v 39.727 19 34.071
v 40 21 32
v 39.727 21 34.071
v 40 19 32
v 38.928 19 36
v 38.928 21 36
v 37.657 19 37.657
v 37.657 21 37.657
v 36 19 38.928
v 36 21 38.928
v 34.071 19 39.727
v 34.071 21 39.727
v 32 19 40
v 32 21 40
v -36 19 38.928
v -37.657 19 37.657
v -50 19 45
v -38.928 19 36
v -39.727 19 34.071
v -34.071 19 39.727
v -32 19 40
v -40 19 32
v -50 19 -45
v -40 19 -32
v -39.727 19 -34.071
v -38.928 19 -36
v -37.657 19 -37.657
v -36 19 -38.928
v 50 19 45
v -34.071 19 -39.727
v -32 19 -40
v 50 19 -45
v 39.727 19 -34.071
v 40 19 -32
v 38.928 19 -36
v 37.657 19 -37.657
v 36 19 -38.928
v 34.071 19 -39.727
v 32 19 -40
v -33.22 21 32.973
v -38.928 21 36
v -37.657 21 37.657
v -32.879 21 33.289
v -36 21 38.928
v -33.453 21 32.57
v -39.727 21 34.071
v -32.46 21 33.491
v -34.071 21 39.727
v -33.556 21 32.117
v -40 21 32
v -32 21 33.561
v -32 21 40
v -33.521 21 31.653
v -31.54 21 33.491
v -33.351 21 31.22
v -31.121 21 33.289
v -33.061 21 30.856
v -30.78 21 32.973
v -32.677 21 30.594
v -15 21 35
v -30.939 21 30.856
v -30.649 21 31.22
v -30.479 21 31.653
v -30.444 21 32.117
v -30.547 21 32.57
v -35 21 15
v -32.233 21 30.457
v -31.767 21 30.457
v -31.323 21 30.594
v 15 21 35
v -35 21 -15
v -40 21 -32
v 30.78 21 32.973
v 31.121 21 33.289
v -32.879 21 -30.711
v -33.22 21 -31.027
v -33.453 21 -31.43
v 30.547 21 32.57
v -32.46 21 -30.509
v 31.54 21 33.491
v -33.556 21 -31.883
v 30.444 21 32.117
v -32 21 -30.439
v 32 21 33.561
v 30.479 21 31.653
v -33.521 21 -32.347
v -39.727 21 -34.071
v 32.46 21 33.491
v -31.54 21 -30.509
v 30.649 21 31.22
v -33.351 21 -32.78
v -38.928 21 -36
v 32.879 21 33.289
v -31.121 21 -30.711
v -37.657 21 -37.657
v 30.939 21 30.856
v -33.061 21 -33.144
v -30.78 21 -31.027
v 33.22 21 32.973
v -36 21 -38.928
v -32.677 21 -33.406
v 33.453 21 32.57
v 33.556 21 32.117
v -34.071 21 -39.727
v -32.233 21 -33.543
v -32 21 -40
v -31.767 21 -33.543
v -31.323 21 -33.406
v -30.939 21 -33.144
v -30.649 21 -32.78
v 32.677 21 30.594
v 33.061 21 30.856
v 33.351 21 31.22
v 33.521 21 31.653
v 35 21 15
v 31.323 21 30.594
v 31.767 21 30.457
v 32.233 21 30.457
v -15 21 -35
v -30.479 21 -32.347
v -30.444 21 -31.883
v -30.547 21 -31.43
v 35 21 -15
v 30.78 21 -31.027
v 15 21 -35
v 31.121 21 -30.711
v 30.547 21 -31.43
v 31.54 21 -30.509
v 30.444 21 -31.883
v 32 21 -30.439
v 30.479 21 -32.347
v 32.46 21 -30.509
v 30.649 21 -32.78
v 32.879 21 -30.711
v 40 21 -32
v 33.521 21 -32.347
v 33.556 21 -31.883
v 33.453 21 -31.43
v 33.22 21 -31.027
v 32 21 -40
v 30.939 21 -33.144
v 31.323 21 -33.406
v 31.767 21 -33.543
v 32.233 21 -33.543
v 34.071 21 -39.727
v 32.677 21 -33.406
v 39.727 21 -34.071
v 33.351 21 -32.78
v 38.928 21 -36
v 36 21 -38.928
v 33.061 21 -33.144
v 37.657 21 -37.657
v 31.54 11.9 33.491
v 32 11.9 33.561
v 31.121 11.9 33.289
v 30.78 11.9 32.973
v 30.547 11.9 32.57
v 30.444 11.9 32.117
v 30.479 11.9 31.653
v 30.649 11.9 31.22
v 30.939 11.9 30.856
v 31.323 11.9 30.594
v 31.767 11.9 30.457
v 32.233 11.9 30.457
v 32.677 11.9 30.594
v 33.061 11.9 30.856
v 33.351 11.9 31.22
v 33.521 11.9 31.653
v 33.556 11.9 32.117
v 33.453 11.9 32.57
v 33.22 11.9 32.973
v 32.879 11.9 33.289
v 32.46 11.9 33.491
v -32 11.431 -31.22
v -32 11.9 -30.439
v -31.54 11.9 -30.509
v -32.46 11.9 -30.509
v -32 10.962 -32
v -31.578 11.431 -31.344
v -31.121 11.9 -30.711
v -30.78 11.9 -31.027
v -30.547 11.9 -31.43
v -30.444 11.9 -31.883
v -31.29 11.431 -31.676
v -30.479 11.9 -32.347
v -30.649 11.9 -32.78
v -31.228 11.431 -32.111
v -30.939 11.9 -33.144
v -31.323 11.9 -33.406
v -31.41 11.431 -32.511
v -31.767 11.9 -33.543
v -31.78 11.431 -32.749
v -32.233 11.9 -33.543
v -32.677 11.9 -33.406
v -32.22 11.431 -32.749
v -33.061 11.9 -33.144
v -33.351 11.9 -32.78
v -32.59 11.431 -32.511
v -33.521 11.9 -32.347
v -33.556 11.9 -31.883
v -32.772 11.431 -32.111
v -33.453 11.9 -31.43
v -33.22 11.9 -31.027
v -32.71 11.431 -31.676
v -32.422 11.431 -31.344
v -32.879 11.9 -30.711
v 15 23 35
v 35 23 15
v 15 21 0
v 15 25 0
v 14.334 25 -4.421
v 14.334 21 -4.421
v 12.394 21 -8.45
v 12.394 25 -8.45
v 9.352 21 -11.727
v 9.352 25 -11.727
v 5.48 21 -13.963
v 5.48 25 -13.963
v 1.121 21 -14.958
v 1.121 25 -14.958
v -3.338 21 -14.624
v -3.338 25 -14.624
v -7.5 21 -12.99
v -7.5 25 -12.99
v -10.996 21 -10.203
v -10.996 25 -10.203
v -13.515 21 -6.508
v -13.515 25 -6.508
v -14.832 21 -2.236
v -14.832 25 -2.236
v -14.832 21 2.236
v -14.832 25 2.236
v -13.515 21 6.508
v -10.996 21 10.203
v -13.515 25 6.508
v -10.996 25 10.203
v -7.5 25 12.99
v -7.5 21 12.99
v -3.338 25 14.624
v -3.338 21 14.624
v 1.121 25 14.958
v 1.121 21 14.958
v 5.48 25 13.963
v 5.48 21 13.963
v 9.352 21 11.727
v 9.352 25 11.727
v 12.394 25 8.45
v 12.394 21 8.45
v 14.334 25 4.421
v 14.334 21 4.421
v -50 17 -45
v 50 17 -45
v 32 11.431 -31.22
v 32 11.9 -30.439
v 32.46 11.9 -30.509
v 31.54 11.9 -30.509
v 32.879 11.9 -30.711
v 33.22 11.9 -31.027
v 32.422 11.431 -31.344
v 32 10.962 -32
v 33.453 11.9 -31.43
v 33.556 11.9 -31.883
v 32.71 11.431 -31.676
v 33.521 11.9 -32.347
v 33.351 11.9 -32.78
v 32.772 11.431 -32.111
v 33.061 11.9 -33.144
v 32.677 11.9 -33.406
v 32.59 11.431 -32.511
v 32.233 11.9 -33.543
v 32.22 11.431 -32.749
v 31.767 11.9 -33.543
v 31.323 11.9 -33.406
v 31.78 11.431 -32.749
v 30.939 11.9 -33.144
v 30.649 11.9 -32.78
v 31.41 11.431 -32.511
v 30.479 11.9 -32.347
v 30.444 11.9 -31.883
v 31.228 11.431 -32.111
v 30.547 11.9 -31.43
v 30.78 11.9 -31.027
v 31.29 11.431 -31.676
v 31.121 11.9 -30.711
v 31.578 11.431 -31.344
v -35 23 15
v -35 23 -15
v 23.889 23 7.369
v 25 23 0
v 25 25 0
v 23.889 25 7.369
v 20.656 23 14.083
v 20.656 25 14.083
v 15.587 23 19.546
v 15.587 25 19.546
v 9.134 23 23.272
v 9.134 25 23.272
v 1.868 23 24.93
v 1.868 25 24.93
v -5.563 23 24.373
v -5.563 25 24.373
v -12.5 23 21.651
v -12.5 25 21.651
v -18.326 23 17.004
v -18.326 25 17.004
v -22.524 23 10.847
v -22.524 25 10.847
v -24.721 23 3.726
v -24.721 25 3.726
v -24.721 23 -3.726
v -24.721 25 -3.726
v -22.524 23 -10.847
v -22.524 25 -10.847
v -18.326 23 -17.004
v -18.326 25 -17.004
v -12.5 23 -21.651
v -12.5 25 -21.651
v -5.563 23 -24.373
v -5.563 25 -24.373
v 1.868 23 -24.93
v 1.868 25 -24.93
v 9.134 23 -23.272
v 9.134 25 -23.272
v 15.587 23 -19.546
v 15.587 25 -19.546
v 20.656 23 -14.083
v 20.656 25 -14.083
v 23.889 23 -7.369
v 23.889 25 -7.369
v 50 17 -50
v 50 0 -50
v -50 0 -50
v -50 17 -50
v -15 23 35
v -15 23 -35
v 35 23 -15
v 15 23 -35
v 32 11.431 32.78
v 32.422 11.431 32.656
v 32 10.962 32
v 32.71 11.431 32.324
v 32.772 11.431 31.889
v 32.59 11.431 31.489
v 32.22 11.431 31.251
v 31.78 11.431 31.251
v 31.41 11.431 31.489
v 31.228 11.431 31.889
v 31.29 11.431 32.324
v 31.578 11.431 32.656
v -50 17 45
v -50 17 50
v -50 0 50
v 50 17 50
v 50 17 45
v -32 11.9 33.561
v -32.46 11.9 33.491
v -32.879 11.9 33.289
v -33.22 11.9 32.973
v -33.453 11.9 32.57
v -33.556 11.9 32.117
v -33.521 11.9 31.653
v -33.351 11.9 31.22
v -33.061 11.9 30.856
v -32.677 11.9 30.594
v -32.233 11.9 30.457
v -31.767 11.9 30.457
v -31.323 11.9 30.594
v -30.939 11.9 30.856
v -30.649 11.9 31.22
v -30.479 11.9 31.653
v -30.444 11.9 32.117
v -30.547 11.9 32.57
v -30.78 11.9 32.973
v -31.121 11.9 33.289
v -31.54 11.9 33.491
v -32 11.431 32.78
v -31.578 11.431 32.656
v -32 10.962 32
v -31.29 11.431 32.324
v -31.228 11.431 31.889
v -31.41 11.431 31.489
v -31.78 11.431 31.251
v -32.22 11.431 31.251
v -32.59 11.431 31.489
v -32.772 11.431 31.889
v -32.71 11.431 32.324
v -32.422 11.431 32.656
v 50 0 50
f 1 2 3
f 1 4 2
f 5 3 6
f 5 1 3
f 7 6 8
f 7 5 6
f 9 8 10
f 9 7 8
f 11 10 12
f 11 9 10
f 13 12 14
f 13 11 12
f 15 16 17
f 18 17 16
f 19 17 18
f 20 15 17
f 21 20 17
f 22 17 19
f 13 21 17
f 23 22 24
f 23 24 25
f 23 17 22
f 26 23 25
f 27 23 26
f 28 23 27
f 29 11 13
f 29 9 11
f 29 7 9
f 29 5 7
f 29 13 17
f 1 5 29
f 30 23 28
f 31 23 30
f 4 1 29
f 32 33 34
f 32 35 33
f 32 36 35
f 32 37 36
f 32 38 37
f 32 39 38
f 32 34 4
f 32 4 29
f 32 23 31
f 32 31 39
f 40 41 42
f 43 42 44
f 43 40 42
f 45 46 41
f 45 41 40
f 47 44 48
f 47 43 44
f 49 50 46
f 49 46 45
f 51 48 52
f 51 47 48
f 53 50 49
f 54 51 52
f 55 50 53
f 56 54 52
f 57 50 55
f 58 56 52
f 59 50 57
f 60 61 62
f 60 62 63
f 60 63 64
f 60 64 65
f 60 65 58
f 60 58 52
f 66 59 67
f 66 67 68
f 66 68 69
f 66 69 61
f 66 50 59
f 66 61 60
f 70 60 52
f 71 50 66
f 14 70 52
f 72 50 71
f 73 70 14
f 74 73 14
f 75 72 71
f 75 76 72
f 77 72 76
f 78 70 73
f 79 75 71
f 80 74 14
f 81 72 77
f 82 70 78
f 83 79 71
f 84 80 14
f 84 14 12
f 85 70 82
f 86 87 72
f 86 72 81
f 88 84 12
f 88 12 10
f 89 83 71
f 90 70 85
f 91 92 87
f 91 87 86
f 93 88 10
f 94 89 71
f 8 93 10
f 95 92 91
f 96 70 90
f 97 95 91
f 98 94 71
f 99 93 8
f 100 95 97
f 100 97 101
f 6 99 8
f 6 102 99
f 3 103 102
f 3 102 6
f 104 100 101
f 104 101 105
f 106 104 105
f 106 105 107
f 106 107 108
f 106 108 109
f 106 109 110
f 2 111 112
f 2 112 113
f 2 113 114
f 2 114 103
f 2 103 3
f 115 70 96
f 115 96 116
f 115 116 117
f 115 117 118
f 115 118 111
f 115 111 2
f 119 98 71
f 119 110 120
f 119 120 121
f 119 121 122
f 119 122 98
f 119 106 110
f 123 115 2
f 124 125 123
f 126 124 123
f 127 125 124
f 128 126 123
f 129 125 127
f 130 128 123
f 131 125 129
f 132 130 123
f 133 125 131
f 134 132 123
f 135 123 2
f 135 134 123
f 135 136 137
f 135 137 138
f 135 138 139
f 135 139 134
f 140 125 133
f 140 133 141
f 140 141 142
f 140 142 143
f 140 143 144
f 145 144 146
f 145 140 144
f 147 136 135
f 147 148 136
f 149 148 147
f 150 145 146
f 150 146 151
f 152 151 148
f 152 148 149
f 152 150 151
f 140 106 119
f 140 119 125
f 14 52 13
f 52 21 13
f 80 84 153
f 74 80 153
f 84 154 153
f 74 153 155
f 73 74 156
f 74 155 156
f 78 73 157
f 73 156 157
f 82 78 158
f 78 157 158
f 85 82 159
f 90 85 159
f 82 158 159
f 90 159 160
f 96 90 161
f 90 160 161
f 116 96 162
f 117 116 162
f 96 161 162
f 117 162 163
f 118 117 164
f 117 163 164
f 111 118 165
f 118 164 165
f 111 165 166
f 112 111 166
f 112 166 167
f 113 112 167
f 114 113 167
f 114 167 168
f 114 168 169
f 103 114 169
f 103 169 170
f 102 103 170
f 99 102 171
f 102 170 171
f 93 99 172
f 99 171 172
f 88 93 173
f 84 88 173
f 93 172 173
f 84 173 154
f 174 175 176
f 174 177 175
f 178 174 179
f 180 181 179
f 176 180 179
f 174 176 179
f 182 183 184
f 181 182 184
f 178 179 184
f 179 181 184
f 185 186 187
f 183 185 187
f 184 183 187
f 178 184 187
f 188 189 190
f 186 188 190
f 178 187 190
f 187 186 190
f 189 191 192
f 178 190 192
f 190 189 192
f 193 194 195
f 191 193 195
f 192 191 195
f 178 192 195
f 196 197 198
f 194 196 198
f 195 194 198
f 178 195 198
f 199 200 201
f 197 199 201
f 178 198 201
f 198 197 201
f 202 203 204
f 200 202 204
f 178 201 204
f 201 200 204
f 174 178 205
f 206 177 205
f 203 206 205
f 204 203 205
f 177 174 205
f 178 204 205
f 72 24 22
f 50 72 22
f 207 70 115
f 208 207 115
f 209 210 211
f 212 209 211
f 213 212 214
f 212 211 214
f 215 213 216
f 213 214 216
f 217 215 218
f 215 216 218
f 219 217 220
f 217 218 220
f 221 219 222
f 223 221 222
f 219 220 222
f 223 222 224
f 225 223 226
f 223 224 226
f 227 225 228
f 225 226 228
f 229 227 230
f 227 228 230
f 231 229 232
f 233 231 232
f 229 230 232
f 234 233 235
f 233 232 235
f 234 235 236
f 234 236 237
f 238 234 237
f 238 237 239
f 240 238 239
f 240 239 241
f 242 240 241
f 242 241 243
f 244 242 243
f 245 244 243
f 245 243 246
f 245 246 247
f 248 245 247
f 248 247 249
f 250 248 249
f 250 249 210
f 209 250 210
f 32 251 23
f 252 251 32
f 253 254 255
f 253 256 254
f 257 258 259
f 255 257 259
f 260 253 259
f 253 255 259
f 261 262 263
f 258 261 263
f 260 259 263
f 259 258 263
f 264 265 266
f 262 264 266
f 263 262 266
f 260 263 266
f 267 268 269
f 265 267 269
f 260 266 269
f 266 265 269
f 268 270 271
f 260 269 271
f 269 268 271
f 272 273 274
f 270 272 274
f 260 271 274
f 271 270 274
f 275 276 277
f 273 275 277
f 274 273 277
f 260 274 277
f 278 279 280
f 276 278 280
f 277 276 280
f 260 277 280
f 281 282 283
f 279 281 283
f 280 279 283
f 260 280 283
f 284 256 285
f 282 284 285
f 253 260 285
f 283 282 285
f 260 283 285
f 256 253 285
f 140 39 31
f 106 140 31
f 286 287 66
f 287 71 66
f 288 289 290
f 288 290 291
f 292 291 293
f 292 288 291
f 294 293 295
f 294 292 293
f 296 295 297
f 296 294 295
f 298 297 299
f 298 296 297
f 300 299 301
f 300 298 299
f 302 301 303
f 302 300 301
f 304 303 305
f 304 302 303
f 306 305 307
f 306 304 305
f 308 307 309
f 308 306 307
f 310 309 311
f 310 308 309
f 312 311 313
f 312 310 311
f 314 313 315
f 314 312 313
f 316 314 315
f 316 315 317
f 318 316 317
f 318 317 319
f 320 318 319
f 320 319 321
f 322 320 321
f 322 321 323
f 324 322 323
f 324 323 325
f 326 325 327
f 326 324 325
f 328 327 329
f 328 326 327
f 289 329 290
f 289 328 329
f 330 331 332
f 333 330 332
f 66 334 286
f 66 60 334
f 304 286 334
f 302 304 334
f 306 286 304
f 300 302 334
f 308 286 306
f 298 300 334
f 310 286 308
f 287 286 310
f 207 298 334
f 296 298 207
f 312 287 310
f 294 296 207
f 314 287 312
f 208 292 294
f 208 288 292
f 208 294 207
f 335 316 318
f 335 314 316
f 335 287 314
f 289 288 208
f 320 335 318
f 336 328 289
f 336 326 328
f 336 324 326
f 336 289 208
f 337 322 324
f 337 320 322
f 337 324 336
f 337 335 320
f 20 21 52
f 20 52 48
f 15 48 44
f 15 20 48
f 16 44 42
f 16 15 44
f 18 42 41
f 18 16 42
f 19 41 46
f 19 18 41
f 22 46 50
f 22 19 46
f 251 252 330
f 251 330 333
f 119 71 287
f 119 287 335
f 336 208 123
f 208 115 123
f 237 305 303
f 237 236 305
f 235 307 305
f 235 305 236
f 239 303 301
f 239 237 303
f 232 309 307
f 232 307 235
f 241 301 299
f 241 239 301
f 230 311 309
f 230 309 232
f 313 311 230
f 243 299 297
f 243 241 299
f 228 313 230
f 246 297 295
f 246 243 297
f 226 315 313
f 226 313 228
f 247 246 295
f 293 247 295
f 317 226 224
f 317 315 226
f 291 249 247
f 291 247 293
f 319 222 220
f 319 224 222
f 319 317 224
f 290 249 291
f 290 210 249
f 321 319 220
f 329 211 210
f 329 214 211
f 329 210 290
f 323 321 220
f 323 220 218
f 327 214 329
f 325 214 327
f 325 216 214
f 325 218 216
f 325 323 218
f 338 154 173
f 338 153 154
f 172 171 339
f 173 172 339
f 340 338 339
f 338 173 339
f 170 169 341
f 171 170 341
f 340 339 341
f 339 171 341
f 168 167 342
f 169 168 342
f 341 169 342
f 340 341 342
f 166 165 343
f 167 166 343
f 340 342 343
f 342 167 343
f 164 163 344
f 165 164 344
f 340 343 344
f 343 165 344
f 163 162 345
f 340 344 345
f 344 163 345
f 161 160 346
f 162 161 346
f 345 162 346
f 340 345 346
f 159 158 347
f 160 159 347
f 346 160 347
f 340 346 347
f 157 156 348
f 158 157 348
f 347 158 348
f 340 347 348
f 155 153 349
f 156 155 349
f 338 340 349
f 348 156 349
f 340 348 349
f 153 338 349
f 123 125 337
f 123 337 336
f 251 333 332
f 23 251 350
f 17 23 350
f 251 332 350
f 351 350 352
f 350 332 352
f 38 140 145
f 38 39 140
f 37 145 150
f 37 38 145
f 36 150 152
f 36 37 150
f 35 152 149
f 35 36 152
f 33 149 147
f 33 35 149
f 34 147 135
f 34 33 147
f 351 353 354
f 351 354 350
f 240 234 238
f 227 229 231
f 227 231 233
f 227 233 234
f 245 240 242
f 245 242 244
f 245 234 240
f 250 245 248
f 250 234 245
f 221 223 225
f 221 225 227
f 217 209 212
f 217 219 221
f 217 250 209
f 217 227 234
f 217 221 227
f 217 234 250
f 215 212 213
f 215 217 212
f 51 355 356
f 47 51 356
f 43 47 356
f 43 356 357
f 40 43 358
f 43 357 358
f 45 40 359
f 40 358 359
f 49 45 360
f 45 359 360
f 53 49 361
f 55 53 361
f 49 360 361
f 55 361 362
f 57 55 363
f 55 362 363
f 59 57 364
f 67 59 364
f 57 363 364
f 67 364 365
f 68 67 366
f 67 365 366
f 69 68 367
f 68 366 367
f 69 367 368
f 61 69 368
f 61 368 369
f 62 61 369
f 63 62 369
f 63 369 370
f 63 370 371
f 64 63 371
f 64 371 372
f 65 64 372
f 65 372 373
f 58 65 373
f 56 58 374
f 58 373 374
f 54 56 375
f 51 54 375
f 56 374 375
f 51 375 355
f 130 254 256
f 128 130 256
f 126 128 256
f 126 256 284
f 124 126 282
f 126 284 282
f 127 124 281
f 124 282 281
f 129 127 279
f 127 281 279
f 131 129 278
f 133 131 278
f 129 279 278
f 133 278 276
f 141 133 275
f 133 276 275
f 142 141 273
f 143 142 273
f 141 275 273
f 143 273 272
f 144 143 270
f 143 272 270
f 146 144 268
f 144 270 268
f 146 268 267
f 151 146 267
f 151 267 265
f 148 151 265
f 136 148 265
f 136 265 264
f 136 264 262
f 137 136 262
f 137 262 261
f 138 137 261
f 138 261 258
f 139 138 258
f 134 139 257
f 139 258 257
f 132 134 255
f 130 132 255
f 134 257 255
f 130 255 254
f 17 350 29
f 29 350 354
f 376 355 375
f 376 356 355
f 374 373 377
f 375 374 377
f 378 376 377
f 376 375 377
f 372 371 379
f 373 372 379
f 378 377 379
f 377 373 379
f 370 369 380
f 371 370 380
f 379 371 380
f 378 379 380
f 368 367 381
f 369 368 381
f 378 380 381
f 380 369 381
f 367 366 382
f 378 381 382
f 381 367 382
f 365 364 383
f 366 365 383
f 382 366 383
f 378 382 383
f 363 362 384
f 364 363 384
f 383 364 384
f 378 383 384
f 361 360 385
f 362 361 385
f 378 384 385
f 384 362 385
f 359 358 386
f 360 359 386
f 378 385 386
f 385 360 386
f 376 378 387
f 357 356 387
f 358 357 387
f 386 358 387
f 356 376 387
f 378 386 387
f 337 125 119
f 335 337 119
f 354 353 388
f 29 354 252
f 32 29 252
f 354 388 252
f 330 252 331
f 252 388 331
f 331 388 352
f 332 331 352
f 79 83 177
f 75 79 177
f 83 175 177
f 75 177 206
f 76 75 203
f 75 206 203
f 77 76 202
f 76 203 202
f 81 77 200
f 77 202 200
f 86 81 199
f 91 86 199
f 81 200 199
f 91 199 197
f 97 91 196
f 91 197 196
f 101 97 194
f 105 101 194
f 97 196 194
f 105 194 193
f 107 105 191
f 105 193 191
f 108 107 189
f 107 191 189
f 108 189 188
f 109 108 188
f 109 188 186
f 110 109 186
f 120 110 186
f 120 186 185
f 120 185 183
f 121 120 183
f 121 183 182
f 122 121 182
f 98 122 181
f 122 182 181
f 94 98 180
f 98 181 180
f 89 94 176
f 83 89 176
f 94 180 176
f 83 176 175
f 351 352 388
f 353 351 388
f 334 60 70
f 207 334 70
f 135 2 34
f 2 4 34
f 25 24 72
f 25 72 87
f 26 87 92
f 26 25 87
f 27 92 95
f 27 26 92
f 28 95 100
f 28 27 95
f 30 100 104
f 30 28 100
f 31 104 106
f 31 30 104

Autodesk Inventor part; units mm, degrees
ref_plane "YZ Plane" through (0, 0, 0) normal (1, 0, 0) x (0, 1, 0)
ref_plane "XZ Plane" through (0, 0, 0) normal (0, 1, 0) x (-1, 0, 0)
ref_plane "XY Plane" through (0, 0, 0) normal (0, 0, 1) x (1, 0, 0)
sketch "Sketch1" plane through (0, 0, 0) normal (0, 1, 0) x (-1, 0, 0)
  line L0 (50, 50) -> (-50, 50)
  line L1 (-50, 50) -> (-50, -50)
  line L2 (-50, -50) -> (50, -50)
  line L3 (50, -50) -> (50, 50)
  line L4 (50, 50) -> (-50, -50) construction
  line L5 (-50, 50) -> (50, -50) construction
  point P0 (0, 0)
  dimension "d0" = 100
  dimension "d1" = 100
extrude "Extrusion1" add sketch "Sketch1" along normal blind 17
sketch "Sketch2" plane through (0, 17, 0) normal (0, 1, 0) x (1, 0, 0)
  line L0 (-50, 50) -> (-50, -50) projected
  line L1 (50, -50) -> (50, 50) projected
  line L2 (-50, -45) -> (50, -45)
  line L3 (-50, -50) -> (50, -50) projected
  line L4 (-50, 45) -> (50, 45)
  line L5 (50, 50) -> (-50, 50) projected
  point P0 (0, 0)
  dimension "d4" = 5
  dimension "d5" = 5
extrude "Extrusion2" add sketch "Sketch2" along normal blind 2 contours L4 L1 L2 L0
sketch "Sketch3" plane through (0, 19, 0) normal (0, 1, 0) x (1, 0, 0)
  line L0 (-32, -40) -> (32, -40)
  line L1 (40, -32) -> (40, 32)
  line L2 (32, 40) -> (-32, 40)
  line L3 (-40, 32) -> (-40, -32)
  line L4 (-40, -40) -> (40, 40) construction
  line L5 (40, -40) -> (-40, 40) construction
  arc A0 (32, -40) -> (40, -32) centre (32, -32) ccw
  arc A1 (40, 32) -> (32, 40) centre (32, 32) ccw
  arc A2 (-32, 40) -> (-40, 32) centre (-32, 32) ccw
  arc A3 (-40, -32) -> (-32, -40) centre (-32, -32) ccw
  point P0 (0, 0)
  dimension "d8" = 80
  dimension "d9" = 80
  dimension "d10" = 8
extrude "Extrusion3" add sketch "Sketch3" along normal blind 2
sketch "Sketch4" plane through (0, 21, 0) normal (0, 1, 0) x (1, 0, 0)
  line L0 (35, -15) -> (35, 15)
  line L1 (-35, 15) -> (-35, -15)
  line L2 (-35, -15) -> (35, 15) construction
  line L3 (35, -15) -> (-35, 15) construction
  line L4 (50, -45) -> (50, 45) projected
  line L5 (-50, -50) -> (50, -50) projected
  line L6 (-15, -35) -> (15, -35)
  line L7 (15, 35) -> (-15, 35)
  line L8 (-15, -35) -> (15, 35) construction
  line L9 (15, -35) -> (-15, 35) construction
  line L10 (-15, -35) -> (-35, -15)
  line L11 (-35, 15) -> (-15, 35)
  line L12 (15, 35) -> (35, 15)
  line L13 (15, -35) -> (35, -15)
  point P0 (0, 0)
  dimension "d13" = 85
  dimension "d16" = 85
extrude "Extrusion4" add sketch "Sketch4" along normal blind 2
sketch "Sketch5" plane through (0, 23, 0) normal (0, 1, 0) x (1, 0, 0)
  circle A0 centre (0, 0) radius 25
  dimension "d19" = 50
extrude "Extrusion5" add sketch "Sketch5" along normal blind 2
sketch "Sketch6" plane through (0, 25, 0) normal (0, 1, 0) x (1, 0, 0)
  circle A0 centre (0, 0) radius 15
  dimension "d22" = 30
extrude "Extrusion6" cut sketch "Sketch6" against normal blind 4
sketch "Sketch7" plane through (0, 21, 0) normal (0, 1, 0) x (1, 0, 0)
  circle A0 centre (-32, -32) radius 1.5
  line L0 (-50, -50) -> (50, -50) projected
  line L1 (-50, 45) -> (-50, -45) projected
  circle A1 centre (-32, 32) radius 1.5
  circle A2 centre (32, -32) radius 1.5
  circle A3 centre (32, 32) radius 1.5
  point P0 (0, 0)
  dimension "d25" = 3
  dimension "d26" = 18
  dimension "d27" = 18
  dimension "d30" = 64
  dimension "d33" = 64
hole "Hole2" at (-32, 21, 32) at (-32, 21, -32) at (32, 21, -32) at (32, 21, 32) direction (0, -1, 0) diameter 3.1211 depth 9.1 tip angle 118 thread size "M3.5x0.35" class "6H" standard "ANSI Metric M Profile"
properties part number "A2P3"
